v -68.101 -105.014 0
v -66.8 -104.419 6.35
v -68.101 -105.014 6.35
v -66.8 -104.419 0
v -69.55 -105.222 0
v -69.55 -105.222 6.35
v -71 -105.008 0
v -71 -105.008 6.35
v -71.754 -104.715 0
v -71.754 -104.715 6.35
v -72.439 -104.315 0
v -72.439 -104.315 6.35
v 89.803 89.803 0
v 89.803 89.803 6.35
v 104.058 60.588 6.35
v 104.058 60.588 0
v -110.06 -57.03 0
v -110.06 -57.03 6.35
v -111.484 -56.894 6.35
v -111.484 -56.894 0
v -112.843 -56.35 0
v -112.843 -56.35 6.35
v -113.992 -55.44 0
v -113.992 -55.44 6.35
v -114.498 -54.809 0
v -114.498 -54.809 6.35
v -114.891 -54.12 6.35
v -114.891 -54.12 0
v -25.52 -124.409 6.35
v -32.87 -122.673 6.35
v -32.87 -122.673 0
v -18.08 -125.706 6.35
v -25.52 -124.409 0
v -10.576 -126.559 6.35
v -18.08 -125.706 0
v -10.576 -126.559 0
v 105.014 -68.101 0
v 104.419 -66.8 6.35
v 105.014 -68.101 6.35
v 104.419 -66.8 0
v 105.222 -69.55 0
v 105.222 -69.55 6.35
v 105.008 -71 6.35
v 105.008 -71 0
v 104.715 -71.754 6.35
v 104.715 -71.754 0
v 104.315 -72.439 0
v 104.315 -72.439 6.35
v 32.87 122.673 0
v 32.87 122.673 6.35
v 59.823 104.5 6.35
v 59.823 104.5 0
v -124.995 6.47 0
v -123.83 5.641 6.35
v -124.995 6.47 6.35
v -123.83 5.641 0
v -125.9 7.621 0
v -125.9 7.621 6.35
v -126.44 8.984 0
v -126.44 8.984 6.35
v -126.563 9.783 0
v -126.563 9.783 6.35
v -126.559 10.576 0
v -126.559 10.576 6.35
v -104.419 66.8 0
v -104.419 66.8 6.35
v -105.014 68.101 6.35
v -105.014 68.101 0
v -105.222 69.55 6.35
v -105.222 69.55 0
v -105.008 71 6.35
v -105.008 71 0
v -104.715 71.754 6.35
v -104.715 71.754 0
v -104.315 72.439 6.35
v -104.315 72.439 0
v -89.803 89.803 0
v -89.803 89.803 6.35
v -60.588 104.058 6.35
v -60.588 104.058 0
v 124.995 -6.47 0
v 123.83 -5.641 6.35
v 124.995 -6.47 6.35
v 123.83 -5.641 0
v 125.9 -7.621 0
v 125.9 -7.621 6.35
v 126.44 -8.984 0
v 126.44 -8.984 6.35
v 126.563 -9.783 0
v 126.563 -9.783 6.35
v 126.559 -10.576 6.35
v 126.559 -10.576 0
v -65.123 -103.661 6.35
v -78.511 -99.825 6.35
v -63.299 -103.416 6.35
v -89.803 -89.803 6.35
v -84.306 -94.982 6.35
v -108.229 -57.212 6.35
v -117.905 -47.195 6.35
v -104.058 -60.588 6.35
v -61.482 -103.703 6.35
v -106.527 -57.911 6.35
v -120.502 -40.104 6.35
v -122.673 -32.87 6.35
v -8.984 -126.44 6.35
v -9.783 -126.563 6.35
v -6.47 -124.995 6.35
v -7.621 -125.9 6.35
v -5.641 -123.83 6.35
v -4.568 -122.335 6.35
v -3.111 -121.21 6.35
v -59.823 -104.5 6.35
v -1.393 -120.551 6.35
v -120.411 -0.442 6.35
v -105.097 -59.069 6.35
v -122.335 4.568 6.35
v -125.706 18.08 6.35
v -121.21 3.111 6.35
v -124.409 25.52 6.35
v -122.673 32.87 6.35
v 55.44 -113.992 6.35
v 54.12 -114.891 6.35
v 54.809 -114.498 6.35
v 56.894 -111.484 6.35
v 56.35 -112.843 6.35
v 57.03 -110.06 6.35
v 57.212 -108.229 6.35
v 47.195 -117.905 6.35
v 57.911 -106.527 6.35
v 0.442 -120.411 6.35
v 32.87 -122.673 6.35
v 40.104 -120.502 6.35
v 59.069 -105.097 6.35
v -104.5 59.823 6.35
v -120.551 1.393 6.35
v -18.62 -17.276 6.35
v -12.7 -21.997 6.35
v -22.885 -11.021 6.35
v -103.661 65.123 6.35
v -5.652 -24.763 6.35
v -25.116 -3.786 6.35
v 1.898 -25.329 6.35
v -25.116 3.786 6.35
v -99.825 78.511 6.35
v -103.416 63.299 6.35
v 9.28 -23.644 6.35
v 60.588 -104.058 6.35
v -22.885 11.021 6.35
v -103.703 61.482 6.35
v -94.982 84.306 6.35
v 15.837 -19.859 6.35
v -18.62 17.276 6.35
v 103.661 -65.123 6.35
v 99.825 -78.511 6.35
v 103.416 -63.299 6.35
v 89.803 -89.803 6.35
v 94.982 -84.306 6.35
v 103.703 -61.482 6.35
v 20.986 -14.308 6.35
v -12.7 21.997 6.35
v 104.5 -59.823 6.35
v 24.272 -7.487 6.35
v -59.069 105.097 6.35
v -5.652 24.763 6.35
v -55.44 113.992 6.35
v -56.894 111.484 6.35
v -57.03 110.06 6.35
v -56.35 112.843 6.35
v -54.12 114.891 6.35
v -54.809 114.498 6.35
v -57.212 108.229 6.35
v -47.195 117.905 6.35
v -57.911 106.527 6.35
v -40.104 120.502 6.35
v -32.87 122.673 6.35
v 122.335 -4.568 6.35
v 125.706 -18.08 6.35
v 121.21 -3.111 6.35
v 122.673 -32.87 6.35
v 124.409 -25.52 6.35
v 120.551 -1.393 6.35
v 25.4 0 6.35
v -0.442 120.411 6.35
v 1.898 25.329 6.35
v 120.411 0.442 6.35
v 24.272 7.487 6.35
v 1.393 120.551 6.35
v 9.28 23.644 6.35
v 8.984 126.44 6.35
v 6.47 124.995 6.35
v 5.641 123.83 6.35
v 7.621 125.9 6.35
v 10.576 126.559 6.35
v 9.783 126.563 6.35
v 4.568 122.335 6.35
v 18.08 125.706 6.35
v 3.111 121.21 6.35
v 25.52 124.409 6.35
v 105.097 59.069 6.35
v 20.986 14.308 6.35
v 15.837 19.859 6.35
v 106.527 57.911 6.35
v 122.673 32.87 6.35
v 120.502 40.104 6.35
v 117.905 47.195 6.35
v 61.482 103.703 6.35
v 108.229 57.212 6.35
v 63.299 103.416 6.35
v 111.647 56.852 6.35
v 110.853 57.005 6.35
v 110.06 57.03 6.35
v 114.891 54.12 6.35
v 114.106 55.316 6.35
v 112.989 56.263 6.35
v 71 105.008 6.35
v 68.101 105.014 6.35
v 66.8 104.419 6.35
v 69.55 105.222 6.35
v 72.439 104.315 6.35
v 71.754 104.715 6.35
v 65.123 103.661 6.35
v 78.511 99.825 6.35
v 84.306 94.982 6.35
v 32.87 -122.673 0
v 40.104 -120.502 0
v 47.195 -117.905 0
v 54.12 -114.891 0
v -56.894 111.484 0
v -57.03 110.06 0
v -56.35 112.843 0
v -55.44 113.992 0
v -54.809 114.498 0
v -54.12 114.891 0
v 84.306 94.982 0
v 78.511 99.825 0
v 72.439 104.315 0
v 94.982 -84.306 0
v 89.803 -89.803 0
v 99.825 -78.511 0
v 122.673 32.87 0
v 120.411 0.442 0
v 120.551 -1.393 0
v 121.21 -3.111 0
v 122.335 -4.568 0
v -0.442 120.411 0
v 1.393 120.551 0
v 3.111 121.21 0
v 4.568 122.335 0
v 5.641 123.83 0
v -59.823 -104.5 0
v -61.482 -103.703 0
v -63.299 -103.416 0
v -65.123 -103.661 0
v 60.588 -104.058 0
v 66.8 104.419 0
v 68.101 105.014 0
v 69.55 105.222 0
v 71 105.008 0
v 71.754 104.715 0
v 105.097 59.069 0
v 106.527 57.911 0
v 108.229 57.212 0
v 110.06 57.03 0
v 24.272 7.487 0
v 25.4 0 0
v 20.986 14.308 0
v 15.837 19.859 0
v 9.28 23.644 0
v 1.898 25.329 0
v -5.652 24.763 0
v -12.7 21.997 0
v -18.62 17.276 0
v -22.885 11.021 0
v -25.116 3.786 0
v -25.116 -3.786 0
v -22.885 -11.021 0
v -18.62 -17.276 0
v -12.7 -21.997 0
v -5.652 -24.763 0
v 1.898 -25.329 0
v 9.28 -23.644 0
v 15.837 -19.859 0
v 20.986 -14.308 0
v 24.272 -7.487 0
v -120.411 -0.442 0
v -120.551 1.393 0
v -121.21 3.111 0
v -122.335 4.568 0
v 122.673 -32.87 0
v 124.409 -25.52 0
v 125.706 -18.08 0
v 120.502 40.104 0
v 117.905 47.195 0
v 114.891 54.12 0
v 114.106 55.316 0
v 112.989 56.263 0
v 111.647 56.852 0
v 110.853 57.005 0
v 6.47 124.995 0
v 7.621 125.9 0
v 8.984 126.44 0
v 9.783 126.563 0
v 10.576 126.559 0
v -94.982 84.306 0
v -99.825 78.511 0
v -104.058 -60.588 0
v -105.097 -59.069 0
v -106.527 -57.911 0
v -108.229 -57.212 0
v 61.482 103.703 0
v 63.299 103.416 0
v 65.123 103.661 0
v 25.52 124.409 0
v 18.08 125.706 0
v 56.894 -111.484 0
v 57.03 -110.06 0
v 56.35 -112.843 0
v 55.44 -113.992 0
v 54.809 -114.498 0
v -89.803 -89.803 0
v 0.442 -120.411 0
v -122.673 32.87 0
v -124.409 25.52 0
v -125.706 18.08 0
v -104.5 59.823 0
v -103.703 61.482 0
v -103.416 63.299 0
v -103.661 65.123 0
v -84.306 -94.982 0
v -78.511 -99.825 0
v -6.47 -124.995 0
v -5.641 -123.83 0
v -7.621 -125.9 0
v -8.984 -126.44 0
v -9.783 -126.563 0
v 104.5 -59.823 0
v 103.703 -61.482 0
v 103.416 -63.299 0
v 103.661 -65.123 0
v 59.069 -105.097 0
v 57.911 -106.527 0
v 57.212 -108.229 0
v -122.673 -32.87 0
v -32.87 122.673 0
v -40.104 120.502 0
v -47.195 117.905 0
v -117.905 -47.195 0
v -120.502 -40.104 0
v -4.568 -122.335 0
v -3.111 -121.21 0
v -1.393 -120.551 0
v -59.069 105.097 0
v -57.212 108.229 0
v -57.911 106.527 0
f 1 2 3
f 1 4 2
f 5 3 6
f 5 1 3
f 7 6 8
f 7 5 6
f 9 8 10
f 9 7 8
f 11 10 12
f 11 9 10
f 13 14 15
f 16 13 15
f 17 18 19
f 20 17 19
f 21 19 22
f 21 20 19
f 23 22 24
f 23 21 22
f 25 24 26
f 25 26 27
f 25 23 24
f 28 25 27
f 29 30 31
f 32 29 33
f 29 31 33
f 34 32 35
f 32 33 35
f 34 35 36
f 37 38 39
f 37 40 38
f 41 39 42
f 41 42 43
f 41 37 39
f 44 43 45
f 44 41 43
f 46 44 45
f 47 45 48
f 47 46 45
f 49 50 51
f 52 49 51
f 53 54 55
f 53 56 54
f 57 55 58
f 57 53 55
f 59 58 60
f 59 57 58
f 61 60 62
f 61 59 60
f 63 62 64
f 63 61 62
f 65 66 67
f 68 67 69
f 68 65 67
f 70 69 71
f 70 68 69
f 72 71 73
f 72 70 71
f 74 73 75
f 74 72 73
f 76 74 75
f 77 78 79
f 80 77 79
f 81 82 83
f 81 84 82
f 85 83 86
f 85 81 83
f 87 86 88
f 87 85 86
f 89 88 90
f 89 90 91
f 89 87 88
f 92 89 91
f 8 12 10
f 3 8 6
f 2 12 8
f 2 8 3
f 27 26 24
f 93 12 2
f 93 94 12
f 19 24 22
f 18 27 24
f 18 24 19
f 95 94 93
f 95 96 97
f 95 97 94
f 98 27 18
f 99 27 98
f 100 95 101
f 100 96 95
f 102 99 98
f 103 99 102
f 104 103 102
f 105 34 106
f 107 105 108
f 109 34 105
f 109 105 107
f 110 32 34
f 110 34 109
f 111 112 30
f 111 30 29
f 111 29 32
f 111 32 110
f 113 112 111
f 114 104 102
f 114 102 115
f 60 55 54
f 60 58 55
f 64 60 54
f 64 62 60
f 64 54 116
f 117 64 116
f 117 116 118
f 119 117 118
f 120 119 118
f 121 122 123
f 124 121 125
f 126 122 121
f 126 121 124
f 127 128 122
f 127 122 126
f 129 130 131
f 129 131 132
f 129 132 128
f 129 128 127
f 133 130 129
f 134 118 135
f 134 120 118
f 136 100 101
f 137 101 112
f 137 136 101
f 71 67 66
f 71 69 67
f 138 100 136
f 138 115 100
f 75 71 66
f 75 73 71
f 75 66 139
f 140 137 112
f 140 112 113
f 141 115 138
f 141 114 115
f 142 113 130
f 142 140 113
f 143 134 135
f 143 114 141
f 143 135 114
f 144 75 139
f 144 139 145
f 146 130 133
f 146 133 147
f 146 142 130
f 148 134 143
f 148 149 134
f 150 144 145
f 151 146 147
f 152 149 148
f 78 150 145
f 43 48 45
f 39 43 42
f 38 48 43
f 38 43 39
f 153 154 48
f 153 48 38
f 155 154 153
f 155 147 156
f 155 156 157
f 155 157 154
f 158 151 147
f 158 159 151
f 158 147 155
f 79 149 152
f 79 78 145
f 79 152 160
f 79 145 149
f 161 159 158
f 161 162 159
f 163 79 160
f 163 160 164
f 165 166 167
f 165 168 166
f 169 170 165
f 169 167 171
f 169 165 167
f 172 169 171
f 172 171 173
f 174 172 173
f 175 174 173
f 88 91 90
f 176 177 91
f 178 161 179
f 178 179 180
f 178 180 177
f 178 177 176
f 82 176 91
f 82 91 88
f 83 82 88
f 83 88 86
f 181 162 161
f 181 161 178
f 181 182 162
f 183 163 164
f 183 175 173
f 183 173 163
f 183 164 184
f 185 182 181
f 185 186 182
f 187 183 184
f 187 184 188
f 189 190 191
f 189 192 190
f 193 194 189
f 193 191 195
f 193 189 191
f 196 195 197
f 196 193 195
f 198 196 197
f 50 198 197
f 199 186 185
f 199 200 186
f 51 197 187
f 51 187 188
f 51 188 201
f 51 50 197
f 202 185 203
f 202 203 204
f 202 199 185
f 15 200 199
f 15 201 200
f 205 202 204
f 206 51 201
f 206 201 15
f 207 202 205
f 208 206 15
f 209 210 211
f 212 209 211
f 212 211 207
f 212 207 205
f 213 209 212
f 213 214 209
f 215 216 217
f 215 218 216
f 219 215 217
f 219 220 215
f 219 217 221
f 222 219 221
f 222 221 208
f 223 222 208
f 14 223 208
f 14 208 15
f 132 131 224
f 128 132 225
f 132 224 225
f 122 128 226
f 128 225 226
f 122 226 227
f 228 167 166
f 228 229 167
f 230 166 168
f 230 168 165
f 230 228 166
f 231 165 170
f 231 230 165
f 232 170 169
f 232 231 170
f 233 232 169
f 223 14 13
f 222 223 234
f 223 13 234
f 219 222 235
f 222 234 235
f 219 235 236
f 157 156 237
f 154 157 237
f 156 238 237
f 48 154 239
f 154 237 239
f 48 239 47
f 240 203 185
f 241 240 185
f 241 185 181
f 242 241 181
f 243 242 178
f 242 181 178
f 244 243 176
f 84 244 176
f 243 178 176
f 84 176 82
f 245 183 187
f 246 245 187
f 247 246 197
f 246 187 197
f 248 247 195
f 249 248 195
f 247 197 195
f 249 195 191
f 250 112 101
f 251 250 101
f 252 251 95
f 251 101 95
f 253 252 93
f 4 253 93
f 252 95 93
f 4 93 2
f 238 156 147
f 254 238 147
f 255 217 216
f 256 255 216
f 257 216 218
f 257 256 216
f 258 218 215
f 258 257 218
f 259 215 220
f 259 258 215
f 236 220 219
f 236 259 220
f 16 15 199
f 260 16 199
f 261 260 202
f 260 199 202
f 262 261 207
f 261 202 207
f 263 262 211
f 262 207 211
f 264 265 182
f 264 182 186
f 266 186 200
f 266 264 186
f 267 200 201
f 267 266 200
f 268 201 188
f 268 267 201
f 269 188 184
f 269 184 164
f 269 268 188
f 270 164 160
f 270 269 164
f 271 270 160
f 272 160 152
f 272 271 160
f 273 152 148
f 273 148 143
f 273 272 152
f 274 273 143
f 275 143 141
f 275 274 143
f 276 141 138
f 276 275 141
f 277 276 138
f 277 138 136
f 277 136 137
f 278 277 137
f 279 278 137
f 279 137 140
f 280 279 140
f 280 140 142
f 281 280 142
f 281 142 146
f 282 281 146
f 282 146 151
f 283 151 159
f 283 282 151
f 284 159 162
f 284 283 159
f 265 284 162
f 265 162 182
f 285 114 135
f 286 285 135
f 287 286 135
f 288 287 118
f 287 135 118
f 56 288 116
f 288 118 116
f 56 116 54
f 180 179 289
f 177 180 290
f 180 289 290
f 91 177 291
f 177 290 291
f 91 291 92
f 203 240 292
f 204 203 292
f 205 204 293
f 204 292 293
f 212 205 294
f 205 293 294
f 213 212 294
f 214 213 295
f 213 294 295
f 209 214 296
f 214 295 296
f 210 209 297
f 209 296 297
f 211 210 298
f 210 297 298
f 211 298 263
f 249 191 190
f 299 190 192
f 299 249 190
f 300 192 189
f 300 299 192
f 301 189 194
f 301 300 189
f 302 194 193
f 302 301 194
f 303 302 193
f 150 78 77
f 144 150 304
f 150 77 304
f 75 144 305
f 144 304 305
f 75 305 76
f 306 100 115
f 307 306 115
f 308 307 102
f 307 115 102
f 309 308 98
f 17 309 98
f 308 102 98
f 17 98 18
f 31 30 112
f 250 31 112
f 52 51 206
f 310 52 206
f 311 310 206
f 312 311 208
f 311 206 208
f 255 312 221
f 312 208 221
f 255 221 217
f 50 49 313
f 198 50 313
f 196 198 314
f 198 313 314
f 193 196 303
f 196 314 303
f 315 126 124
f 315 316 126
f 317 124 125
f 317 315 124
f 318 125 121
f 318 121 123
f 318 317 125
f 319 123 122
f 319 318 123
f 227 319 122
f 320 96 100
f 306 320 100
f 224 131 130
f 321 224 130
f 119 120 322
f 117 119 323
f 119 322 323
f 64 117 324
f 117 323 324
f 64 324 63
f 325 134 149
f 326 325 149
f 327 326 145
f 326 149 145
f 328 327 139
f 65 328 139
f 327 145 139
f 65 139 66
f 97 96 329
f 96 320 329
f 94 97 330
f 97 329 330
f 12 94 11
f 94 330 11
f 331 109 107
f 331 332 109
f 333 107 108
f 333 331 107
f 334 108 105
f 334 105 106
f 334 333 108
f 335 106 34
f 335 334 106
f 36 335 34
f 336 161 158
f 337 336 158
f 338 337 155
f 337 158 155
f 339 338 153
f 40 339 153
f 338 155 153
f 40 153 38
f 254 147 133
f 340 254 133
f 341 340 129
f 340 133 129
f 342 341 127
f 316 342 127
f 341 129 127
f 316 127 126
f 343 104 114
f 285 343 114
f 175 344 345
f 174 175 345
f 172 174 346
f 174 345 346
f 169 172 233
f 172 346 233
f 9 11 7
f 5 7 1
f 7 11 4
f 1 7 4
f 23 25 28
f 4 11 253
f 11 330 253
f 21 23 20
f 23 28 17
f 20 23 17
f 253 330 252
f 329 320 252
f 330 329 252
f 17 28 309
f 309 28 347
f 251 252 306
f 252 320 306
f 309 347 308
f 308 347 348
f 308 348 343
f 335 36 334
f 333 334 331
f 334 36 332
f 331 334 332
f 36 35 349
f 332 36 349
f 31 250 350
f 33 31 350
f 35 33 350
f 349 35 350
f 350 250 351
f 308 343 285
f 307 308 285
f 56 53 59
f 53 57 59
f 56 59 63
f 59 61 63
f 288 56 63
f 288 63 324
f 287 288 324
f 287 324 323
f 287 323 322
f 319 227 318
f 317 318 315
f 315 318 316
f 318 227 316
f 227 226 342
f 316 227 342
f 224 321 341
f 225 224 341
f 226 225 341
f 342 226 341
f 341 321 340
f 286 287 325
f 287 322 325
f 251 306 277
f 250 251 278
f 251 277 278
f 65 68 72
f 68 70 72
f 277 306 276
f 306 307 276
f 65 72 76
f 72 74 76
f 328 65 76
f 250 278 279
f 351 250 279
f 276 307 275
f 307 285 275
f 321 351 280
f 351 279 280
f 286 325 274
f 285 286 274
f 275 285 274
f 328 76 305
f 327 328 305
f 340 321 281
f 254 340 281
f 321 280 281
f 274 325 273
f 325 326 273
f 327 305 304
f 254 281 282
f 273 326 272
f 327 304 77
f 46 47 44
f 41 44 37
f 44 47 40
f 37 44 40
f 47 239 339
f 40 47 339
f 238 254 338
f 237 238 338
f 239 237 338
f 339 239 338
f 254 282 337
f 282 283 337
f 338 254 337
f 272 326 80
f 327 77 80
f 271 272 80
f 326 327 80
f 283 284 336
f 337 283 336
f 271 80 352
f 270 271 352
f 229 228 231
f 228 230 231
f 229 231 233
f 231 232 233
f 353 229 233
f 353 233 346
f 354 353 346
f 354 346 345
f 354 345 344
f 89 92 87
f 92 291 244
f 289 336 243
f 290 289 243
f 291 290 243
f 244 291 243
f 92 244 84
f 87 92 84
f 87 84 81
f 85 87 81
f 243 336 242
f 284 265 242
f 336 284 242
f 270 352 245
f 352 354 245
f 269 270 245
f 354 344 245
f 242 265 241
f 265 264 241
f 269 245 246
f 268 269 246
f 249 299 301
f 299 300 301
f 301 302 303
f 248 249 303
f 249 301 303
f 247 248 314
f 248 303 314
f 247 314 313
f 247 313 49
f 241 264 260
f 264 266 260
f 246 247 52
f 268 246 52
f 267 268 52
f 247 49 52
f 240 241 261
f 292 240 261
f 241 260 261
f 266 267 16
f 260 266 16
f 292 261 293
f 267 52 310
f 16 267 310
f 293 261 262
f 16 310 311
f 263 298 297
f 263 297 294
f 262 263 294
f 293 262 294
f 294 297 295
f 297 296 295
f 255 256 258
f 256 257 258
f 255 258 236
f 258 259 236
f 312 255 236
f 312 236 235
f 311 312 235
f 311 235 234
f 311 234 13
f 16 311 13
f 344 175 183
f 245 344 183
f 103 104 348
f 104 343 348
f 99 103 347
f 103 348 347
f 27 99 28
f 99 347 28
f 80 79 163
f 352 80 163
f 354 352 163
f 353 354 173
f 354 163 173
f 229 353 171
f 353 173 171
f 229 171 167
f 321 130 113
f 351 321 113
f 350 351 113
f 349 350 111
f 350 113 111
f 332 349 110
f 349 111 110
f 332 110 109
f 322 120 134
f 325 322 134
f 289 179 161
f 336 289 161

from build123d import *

# Parameters (mm, degrees)
F0_R     = 127
F0_R_2   = 25.4
F1_DEPTH = 6.35
F3_DEPTH = 6.351
F4_R     = 5.08


with BuildPart() as f1:
    # F0 (on Top) → F1 (new body)
    with BuildSketch(Plane.XY):
        Circle(F0_R)
        Circle(F0_R_2, mode=Mode.SUBTRACT)
    extrude(amount=F1_DEPTH)

    # F2 (on face) → F3 (cut, through all)
    with BuildSketch(Plane.XY.offset(6.35)):
        with BuildLine():
            ThreePointArc((-0.4417075975, 120.4113812744), (4.3658298911, 122.1349231885), (6.349286539, 126.8411863727))
            ThreePointArc((6.349286539, 126.8411863727), (-13.4231750663, 126.288631203), (-32.870018728, 122.6725799387))
            Line((-32.870018728, 122.6725799387), (-0.4417075975, 120.4113812744))
        make_face()
        with BuildLine():
            ThreePointArc((-60.5882206377, 104.0584612897), (-57.286542, 107.954861116), (-57.9219497477, 113.0223329145))
            ThreePointArc((-57.9219497477, 113.0223329145), (-74.7691262084, 102.6575752978), (-89.8025612107, 89.8025612107))
            Line((-89.8025612107, 89.8025612107), (-60.5882206377, 104.0584612897))
        make_face()
        with BuildLine():
            ThreePointArc((-104.5001688872, 59.8231606367), (-103.5890312249, 64.8483811885), (-106.6730463754, 68.9192366251))
            ThreePointArc((-106.6730463754, 68.9192366251), (-116.0807503642, 51.5195049947), (-122.6725799387, 32.870018728))
            Line((-122.6725799387, 32.870018728), (-104.5001688872, 59.8231606367))
        make_face()
        with BuildLine():
            ThreePointArc((-120.4113812744, -0.4417075975), (-122.1349231885, 4.3658298911), (-126.8411863727, 6.349286539))
            ThreePointArc((-126.8411863727, 6.349286539), (-126.288631203, -13.4231750663), (-122.6725799387, -32.870018728))
            Line((-122.6725799387, -32.870018728), (-120.4113812744, -0.4417075975))
        make_face()
        with BuildLine():
            ThreePointArc((-104.0584612897, -60.5882206377), (-107.954861116, -57.286542), (-113.0223329145, -57.9219497477))
            ThreePointArc((-113.0223329145, -57.9219497477), (-102.6575752978, -74.7691262084), (-89.8025612107, -89.8025612107))
            Line((-89.8025612107, -89.8025612107), (-104.0584612897, -60.5882206377))
        make_face()
        with BuildLine():
            ThreePointArc((-59.8231606367, -104.5001688872), (-64.8483811885, -103.5890312249), (-68.9192366251, -106.6730463754))
            ThreePointArc((-68.9192366251, -106.6730463754), (-51.5195049947, -116.0807503642), (-32.870018728, -122.6725799387))
            Line((-32.870018728, -122.6725799387), (-59.8231606367, -104.5001688872))
        make_face()
        with BuildLine():
            ThreePointArc((0.4417075975, -120.4113812744), (-4.3658298911, -122.1349231885), (-6.349286539, -126.8411863727))
            ThreePointArc((-6.349286539, -126.8411863727), (13.4231750663, -126.288631203), (32.870018728, -122.6725799387))
            Line((32.870018728, -122.6725799387), (0.4417075975, -120.4113812744))
        make_face()
        with BuildLine():
            ThreePointArc((60.5882206377, -104.0584612897), (57.286542, -107.954861116), (57.9219497477, -113.0223329145))
            ThreePointArc((57.9219497477, -113.0223329145), (74.7691262084, -102.6575752978), (89.8025612107, -89.8025612107))
            Line((89.8025612107, -89.8025612107), (60.5882206377, -104.0584612897))
        make_face()
        with BuildLine():
            ThreePointArc((104.5001688872, -59.8231606367), (103.5890312249, -64.8483811885), (106.6730463754, -68.9192366251))
            ThreePointArc((106.6730463754, -68.9192366251), (116.0807503642, -51.5195049947), (122.6725799387, -32.870018728))
            Line((122.6725799387, -32.870018728), (104.5001688872, -59.8231606367))
        make_face()
        with BuildLine():
            ThreePointArc((120.4113812744, 0.4417075975), (122.1349231885, -4.3658298911), (126.8411863727, -6.349286539))
            ThreePointArc((126.8411863727, -6.349286539), (126.288631203, 13.4231750663), (122.6725799387, 32.870018728))
            Line((122.6725799387, 32.870018728), (120.4113812744, 0.4417075975))
        make_face()
        with BuildLine():
            ThreePointArc((104.0584612897, 60.5882206377), (107.954861116, 57.286542), (113.0223329145, 57.9219497477))
            ThreePointArc((113.0223329145, 57.9219497477), (102.6575752978, 74.7691262084), (89.8025612107, 89.8025612107))
            Line((89.8025612107, 89.8025612107), (104.0584612897, 60.5882206377))
        make_face()
        with BuildLine():
            ThreePointArc((59.8231606367, 104.5001688872), (64.8483811885, 103.5890312249), (68.9192366251, 106.6730463754))
            ThreePointArc((68.9192366251, 106.6730463754), (51.5195049947, 116.0807503642), (32.870018728, 122.6725799387))
            Line((32.870018728, 122.6725799387), (59.8231606367, 104.5001688872))
        make_face()
    extrude(amount=-F3_DEPTH, mode=Mode.SUBTRACT)

    # F4
    f4_edges = [f1.edges().sort_by_distance(p)[0] for p in [
        (6.349287, 126.841186, 3.175),
        (68.919237, 106.673046, 3.175),
        (113.022333, 57.92195, 3.175),
        (126.841186, -6.349287, 3.175),
        (106.673046, -68.919237, 3.175),
        (-57.92195, 113.022333, 3.175),
        (-106.673046, 68.919237, 3.175),
        (-126.841186, 6.349287, 3.175),
        (-113.022333, -57.92195, 3.175),
        (-68.919237, -106.673046, 3.175),
        (-6.349287, -126.841186, 3.175),
        (57.92195, -113.022333, 3.175),
    ]]
    fillet(f4_edges, radius=F4_R)


solid = f1.part
